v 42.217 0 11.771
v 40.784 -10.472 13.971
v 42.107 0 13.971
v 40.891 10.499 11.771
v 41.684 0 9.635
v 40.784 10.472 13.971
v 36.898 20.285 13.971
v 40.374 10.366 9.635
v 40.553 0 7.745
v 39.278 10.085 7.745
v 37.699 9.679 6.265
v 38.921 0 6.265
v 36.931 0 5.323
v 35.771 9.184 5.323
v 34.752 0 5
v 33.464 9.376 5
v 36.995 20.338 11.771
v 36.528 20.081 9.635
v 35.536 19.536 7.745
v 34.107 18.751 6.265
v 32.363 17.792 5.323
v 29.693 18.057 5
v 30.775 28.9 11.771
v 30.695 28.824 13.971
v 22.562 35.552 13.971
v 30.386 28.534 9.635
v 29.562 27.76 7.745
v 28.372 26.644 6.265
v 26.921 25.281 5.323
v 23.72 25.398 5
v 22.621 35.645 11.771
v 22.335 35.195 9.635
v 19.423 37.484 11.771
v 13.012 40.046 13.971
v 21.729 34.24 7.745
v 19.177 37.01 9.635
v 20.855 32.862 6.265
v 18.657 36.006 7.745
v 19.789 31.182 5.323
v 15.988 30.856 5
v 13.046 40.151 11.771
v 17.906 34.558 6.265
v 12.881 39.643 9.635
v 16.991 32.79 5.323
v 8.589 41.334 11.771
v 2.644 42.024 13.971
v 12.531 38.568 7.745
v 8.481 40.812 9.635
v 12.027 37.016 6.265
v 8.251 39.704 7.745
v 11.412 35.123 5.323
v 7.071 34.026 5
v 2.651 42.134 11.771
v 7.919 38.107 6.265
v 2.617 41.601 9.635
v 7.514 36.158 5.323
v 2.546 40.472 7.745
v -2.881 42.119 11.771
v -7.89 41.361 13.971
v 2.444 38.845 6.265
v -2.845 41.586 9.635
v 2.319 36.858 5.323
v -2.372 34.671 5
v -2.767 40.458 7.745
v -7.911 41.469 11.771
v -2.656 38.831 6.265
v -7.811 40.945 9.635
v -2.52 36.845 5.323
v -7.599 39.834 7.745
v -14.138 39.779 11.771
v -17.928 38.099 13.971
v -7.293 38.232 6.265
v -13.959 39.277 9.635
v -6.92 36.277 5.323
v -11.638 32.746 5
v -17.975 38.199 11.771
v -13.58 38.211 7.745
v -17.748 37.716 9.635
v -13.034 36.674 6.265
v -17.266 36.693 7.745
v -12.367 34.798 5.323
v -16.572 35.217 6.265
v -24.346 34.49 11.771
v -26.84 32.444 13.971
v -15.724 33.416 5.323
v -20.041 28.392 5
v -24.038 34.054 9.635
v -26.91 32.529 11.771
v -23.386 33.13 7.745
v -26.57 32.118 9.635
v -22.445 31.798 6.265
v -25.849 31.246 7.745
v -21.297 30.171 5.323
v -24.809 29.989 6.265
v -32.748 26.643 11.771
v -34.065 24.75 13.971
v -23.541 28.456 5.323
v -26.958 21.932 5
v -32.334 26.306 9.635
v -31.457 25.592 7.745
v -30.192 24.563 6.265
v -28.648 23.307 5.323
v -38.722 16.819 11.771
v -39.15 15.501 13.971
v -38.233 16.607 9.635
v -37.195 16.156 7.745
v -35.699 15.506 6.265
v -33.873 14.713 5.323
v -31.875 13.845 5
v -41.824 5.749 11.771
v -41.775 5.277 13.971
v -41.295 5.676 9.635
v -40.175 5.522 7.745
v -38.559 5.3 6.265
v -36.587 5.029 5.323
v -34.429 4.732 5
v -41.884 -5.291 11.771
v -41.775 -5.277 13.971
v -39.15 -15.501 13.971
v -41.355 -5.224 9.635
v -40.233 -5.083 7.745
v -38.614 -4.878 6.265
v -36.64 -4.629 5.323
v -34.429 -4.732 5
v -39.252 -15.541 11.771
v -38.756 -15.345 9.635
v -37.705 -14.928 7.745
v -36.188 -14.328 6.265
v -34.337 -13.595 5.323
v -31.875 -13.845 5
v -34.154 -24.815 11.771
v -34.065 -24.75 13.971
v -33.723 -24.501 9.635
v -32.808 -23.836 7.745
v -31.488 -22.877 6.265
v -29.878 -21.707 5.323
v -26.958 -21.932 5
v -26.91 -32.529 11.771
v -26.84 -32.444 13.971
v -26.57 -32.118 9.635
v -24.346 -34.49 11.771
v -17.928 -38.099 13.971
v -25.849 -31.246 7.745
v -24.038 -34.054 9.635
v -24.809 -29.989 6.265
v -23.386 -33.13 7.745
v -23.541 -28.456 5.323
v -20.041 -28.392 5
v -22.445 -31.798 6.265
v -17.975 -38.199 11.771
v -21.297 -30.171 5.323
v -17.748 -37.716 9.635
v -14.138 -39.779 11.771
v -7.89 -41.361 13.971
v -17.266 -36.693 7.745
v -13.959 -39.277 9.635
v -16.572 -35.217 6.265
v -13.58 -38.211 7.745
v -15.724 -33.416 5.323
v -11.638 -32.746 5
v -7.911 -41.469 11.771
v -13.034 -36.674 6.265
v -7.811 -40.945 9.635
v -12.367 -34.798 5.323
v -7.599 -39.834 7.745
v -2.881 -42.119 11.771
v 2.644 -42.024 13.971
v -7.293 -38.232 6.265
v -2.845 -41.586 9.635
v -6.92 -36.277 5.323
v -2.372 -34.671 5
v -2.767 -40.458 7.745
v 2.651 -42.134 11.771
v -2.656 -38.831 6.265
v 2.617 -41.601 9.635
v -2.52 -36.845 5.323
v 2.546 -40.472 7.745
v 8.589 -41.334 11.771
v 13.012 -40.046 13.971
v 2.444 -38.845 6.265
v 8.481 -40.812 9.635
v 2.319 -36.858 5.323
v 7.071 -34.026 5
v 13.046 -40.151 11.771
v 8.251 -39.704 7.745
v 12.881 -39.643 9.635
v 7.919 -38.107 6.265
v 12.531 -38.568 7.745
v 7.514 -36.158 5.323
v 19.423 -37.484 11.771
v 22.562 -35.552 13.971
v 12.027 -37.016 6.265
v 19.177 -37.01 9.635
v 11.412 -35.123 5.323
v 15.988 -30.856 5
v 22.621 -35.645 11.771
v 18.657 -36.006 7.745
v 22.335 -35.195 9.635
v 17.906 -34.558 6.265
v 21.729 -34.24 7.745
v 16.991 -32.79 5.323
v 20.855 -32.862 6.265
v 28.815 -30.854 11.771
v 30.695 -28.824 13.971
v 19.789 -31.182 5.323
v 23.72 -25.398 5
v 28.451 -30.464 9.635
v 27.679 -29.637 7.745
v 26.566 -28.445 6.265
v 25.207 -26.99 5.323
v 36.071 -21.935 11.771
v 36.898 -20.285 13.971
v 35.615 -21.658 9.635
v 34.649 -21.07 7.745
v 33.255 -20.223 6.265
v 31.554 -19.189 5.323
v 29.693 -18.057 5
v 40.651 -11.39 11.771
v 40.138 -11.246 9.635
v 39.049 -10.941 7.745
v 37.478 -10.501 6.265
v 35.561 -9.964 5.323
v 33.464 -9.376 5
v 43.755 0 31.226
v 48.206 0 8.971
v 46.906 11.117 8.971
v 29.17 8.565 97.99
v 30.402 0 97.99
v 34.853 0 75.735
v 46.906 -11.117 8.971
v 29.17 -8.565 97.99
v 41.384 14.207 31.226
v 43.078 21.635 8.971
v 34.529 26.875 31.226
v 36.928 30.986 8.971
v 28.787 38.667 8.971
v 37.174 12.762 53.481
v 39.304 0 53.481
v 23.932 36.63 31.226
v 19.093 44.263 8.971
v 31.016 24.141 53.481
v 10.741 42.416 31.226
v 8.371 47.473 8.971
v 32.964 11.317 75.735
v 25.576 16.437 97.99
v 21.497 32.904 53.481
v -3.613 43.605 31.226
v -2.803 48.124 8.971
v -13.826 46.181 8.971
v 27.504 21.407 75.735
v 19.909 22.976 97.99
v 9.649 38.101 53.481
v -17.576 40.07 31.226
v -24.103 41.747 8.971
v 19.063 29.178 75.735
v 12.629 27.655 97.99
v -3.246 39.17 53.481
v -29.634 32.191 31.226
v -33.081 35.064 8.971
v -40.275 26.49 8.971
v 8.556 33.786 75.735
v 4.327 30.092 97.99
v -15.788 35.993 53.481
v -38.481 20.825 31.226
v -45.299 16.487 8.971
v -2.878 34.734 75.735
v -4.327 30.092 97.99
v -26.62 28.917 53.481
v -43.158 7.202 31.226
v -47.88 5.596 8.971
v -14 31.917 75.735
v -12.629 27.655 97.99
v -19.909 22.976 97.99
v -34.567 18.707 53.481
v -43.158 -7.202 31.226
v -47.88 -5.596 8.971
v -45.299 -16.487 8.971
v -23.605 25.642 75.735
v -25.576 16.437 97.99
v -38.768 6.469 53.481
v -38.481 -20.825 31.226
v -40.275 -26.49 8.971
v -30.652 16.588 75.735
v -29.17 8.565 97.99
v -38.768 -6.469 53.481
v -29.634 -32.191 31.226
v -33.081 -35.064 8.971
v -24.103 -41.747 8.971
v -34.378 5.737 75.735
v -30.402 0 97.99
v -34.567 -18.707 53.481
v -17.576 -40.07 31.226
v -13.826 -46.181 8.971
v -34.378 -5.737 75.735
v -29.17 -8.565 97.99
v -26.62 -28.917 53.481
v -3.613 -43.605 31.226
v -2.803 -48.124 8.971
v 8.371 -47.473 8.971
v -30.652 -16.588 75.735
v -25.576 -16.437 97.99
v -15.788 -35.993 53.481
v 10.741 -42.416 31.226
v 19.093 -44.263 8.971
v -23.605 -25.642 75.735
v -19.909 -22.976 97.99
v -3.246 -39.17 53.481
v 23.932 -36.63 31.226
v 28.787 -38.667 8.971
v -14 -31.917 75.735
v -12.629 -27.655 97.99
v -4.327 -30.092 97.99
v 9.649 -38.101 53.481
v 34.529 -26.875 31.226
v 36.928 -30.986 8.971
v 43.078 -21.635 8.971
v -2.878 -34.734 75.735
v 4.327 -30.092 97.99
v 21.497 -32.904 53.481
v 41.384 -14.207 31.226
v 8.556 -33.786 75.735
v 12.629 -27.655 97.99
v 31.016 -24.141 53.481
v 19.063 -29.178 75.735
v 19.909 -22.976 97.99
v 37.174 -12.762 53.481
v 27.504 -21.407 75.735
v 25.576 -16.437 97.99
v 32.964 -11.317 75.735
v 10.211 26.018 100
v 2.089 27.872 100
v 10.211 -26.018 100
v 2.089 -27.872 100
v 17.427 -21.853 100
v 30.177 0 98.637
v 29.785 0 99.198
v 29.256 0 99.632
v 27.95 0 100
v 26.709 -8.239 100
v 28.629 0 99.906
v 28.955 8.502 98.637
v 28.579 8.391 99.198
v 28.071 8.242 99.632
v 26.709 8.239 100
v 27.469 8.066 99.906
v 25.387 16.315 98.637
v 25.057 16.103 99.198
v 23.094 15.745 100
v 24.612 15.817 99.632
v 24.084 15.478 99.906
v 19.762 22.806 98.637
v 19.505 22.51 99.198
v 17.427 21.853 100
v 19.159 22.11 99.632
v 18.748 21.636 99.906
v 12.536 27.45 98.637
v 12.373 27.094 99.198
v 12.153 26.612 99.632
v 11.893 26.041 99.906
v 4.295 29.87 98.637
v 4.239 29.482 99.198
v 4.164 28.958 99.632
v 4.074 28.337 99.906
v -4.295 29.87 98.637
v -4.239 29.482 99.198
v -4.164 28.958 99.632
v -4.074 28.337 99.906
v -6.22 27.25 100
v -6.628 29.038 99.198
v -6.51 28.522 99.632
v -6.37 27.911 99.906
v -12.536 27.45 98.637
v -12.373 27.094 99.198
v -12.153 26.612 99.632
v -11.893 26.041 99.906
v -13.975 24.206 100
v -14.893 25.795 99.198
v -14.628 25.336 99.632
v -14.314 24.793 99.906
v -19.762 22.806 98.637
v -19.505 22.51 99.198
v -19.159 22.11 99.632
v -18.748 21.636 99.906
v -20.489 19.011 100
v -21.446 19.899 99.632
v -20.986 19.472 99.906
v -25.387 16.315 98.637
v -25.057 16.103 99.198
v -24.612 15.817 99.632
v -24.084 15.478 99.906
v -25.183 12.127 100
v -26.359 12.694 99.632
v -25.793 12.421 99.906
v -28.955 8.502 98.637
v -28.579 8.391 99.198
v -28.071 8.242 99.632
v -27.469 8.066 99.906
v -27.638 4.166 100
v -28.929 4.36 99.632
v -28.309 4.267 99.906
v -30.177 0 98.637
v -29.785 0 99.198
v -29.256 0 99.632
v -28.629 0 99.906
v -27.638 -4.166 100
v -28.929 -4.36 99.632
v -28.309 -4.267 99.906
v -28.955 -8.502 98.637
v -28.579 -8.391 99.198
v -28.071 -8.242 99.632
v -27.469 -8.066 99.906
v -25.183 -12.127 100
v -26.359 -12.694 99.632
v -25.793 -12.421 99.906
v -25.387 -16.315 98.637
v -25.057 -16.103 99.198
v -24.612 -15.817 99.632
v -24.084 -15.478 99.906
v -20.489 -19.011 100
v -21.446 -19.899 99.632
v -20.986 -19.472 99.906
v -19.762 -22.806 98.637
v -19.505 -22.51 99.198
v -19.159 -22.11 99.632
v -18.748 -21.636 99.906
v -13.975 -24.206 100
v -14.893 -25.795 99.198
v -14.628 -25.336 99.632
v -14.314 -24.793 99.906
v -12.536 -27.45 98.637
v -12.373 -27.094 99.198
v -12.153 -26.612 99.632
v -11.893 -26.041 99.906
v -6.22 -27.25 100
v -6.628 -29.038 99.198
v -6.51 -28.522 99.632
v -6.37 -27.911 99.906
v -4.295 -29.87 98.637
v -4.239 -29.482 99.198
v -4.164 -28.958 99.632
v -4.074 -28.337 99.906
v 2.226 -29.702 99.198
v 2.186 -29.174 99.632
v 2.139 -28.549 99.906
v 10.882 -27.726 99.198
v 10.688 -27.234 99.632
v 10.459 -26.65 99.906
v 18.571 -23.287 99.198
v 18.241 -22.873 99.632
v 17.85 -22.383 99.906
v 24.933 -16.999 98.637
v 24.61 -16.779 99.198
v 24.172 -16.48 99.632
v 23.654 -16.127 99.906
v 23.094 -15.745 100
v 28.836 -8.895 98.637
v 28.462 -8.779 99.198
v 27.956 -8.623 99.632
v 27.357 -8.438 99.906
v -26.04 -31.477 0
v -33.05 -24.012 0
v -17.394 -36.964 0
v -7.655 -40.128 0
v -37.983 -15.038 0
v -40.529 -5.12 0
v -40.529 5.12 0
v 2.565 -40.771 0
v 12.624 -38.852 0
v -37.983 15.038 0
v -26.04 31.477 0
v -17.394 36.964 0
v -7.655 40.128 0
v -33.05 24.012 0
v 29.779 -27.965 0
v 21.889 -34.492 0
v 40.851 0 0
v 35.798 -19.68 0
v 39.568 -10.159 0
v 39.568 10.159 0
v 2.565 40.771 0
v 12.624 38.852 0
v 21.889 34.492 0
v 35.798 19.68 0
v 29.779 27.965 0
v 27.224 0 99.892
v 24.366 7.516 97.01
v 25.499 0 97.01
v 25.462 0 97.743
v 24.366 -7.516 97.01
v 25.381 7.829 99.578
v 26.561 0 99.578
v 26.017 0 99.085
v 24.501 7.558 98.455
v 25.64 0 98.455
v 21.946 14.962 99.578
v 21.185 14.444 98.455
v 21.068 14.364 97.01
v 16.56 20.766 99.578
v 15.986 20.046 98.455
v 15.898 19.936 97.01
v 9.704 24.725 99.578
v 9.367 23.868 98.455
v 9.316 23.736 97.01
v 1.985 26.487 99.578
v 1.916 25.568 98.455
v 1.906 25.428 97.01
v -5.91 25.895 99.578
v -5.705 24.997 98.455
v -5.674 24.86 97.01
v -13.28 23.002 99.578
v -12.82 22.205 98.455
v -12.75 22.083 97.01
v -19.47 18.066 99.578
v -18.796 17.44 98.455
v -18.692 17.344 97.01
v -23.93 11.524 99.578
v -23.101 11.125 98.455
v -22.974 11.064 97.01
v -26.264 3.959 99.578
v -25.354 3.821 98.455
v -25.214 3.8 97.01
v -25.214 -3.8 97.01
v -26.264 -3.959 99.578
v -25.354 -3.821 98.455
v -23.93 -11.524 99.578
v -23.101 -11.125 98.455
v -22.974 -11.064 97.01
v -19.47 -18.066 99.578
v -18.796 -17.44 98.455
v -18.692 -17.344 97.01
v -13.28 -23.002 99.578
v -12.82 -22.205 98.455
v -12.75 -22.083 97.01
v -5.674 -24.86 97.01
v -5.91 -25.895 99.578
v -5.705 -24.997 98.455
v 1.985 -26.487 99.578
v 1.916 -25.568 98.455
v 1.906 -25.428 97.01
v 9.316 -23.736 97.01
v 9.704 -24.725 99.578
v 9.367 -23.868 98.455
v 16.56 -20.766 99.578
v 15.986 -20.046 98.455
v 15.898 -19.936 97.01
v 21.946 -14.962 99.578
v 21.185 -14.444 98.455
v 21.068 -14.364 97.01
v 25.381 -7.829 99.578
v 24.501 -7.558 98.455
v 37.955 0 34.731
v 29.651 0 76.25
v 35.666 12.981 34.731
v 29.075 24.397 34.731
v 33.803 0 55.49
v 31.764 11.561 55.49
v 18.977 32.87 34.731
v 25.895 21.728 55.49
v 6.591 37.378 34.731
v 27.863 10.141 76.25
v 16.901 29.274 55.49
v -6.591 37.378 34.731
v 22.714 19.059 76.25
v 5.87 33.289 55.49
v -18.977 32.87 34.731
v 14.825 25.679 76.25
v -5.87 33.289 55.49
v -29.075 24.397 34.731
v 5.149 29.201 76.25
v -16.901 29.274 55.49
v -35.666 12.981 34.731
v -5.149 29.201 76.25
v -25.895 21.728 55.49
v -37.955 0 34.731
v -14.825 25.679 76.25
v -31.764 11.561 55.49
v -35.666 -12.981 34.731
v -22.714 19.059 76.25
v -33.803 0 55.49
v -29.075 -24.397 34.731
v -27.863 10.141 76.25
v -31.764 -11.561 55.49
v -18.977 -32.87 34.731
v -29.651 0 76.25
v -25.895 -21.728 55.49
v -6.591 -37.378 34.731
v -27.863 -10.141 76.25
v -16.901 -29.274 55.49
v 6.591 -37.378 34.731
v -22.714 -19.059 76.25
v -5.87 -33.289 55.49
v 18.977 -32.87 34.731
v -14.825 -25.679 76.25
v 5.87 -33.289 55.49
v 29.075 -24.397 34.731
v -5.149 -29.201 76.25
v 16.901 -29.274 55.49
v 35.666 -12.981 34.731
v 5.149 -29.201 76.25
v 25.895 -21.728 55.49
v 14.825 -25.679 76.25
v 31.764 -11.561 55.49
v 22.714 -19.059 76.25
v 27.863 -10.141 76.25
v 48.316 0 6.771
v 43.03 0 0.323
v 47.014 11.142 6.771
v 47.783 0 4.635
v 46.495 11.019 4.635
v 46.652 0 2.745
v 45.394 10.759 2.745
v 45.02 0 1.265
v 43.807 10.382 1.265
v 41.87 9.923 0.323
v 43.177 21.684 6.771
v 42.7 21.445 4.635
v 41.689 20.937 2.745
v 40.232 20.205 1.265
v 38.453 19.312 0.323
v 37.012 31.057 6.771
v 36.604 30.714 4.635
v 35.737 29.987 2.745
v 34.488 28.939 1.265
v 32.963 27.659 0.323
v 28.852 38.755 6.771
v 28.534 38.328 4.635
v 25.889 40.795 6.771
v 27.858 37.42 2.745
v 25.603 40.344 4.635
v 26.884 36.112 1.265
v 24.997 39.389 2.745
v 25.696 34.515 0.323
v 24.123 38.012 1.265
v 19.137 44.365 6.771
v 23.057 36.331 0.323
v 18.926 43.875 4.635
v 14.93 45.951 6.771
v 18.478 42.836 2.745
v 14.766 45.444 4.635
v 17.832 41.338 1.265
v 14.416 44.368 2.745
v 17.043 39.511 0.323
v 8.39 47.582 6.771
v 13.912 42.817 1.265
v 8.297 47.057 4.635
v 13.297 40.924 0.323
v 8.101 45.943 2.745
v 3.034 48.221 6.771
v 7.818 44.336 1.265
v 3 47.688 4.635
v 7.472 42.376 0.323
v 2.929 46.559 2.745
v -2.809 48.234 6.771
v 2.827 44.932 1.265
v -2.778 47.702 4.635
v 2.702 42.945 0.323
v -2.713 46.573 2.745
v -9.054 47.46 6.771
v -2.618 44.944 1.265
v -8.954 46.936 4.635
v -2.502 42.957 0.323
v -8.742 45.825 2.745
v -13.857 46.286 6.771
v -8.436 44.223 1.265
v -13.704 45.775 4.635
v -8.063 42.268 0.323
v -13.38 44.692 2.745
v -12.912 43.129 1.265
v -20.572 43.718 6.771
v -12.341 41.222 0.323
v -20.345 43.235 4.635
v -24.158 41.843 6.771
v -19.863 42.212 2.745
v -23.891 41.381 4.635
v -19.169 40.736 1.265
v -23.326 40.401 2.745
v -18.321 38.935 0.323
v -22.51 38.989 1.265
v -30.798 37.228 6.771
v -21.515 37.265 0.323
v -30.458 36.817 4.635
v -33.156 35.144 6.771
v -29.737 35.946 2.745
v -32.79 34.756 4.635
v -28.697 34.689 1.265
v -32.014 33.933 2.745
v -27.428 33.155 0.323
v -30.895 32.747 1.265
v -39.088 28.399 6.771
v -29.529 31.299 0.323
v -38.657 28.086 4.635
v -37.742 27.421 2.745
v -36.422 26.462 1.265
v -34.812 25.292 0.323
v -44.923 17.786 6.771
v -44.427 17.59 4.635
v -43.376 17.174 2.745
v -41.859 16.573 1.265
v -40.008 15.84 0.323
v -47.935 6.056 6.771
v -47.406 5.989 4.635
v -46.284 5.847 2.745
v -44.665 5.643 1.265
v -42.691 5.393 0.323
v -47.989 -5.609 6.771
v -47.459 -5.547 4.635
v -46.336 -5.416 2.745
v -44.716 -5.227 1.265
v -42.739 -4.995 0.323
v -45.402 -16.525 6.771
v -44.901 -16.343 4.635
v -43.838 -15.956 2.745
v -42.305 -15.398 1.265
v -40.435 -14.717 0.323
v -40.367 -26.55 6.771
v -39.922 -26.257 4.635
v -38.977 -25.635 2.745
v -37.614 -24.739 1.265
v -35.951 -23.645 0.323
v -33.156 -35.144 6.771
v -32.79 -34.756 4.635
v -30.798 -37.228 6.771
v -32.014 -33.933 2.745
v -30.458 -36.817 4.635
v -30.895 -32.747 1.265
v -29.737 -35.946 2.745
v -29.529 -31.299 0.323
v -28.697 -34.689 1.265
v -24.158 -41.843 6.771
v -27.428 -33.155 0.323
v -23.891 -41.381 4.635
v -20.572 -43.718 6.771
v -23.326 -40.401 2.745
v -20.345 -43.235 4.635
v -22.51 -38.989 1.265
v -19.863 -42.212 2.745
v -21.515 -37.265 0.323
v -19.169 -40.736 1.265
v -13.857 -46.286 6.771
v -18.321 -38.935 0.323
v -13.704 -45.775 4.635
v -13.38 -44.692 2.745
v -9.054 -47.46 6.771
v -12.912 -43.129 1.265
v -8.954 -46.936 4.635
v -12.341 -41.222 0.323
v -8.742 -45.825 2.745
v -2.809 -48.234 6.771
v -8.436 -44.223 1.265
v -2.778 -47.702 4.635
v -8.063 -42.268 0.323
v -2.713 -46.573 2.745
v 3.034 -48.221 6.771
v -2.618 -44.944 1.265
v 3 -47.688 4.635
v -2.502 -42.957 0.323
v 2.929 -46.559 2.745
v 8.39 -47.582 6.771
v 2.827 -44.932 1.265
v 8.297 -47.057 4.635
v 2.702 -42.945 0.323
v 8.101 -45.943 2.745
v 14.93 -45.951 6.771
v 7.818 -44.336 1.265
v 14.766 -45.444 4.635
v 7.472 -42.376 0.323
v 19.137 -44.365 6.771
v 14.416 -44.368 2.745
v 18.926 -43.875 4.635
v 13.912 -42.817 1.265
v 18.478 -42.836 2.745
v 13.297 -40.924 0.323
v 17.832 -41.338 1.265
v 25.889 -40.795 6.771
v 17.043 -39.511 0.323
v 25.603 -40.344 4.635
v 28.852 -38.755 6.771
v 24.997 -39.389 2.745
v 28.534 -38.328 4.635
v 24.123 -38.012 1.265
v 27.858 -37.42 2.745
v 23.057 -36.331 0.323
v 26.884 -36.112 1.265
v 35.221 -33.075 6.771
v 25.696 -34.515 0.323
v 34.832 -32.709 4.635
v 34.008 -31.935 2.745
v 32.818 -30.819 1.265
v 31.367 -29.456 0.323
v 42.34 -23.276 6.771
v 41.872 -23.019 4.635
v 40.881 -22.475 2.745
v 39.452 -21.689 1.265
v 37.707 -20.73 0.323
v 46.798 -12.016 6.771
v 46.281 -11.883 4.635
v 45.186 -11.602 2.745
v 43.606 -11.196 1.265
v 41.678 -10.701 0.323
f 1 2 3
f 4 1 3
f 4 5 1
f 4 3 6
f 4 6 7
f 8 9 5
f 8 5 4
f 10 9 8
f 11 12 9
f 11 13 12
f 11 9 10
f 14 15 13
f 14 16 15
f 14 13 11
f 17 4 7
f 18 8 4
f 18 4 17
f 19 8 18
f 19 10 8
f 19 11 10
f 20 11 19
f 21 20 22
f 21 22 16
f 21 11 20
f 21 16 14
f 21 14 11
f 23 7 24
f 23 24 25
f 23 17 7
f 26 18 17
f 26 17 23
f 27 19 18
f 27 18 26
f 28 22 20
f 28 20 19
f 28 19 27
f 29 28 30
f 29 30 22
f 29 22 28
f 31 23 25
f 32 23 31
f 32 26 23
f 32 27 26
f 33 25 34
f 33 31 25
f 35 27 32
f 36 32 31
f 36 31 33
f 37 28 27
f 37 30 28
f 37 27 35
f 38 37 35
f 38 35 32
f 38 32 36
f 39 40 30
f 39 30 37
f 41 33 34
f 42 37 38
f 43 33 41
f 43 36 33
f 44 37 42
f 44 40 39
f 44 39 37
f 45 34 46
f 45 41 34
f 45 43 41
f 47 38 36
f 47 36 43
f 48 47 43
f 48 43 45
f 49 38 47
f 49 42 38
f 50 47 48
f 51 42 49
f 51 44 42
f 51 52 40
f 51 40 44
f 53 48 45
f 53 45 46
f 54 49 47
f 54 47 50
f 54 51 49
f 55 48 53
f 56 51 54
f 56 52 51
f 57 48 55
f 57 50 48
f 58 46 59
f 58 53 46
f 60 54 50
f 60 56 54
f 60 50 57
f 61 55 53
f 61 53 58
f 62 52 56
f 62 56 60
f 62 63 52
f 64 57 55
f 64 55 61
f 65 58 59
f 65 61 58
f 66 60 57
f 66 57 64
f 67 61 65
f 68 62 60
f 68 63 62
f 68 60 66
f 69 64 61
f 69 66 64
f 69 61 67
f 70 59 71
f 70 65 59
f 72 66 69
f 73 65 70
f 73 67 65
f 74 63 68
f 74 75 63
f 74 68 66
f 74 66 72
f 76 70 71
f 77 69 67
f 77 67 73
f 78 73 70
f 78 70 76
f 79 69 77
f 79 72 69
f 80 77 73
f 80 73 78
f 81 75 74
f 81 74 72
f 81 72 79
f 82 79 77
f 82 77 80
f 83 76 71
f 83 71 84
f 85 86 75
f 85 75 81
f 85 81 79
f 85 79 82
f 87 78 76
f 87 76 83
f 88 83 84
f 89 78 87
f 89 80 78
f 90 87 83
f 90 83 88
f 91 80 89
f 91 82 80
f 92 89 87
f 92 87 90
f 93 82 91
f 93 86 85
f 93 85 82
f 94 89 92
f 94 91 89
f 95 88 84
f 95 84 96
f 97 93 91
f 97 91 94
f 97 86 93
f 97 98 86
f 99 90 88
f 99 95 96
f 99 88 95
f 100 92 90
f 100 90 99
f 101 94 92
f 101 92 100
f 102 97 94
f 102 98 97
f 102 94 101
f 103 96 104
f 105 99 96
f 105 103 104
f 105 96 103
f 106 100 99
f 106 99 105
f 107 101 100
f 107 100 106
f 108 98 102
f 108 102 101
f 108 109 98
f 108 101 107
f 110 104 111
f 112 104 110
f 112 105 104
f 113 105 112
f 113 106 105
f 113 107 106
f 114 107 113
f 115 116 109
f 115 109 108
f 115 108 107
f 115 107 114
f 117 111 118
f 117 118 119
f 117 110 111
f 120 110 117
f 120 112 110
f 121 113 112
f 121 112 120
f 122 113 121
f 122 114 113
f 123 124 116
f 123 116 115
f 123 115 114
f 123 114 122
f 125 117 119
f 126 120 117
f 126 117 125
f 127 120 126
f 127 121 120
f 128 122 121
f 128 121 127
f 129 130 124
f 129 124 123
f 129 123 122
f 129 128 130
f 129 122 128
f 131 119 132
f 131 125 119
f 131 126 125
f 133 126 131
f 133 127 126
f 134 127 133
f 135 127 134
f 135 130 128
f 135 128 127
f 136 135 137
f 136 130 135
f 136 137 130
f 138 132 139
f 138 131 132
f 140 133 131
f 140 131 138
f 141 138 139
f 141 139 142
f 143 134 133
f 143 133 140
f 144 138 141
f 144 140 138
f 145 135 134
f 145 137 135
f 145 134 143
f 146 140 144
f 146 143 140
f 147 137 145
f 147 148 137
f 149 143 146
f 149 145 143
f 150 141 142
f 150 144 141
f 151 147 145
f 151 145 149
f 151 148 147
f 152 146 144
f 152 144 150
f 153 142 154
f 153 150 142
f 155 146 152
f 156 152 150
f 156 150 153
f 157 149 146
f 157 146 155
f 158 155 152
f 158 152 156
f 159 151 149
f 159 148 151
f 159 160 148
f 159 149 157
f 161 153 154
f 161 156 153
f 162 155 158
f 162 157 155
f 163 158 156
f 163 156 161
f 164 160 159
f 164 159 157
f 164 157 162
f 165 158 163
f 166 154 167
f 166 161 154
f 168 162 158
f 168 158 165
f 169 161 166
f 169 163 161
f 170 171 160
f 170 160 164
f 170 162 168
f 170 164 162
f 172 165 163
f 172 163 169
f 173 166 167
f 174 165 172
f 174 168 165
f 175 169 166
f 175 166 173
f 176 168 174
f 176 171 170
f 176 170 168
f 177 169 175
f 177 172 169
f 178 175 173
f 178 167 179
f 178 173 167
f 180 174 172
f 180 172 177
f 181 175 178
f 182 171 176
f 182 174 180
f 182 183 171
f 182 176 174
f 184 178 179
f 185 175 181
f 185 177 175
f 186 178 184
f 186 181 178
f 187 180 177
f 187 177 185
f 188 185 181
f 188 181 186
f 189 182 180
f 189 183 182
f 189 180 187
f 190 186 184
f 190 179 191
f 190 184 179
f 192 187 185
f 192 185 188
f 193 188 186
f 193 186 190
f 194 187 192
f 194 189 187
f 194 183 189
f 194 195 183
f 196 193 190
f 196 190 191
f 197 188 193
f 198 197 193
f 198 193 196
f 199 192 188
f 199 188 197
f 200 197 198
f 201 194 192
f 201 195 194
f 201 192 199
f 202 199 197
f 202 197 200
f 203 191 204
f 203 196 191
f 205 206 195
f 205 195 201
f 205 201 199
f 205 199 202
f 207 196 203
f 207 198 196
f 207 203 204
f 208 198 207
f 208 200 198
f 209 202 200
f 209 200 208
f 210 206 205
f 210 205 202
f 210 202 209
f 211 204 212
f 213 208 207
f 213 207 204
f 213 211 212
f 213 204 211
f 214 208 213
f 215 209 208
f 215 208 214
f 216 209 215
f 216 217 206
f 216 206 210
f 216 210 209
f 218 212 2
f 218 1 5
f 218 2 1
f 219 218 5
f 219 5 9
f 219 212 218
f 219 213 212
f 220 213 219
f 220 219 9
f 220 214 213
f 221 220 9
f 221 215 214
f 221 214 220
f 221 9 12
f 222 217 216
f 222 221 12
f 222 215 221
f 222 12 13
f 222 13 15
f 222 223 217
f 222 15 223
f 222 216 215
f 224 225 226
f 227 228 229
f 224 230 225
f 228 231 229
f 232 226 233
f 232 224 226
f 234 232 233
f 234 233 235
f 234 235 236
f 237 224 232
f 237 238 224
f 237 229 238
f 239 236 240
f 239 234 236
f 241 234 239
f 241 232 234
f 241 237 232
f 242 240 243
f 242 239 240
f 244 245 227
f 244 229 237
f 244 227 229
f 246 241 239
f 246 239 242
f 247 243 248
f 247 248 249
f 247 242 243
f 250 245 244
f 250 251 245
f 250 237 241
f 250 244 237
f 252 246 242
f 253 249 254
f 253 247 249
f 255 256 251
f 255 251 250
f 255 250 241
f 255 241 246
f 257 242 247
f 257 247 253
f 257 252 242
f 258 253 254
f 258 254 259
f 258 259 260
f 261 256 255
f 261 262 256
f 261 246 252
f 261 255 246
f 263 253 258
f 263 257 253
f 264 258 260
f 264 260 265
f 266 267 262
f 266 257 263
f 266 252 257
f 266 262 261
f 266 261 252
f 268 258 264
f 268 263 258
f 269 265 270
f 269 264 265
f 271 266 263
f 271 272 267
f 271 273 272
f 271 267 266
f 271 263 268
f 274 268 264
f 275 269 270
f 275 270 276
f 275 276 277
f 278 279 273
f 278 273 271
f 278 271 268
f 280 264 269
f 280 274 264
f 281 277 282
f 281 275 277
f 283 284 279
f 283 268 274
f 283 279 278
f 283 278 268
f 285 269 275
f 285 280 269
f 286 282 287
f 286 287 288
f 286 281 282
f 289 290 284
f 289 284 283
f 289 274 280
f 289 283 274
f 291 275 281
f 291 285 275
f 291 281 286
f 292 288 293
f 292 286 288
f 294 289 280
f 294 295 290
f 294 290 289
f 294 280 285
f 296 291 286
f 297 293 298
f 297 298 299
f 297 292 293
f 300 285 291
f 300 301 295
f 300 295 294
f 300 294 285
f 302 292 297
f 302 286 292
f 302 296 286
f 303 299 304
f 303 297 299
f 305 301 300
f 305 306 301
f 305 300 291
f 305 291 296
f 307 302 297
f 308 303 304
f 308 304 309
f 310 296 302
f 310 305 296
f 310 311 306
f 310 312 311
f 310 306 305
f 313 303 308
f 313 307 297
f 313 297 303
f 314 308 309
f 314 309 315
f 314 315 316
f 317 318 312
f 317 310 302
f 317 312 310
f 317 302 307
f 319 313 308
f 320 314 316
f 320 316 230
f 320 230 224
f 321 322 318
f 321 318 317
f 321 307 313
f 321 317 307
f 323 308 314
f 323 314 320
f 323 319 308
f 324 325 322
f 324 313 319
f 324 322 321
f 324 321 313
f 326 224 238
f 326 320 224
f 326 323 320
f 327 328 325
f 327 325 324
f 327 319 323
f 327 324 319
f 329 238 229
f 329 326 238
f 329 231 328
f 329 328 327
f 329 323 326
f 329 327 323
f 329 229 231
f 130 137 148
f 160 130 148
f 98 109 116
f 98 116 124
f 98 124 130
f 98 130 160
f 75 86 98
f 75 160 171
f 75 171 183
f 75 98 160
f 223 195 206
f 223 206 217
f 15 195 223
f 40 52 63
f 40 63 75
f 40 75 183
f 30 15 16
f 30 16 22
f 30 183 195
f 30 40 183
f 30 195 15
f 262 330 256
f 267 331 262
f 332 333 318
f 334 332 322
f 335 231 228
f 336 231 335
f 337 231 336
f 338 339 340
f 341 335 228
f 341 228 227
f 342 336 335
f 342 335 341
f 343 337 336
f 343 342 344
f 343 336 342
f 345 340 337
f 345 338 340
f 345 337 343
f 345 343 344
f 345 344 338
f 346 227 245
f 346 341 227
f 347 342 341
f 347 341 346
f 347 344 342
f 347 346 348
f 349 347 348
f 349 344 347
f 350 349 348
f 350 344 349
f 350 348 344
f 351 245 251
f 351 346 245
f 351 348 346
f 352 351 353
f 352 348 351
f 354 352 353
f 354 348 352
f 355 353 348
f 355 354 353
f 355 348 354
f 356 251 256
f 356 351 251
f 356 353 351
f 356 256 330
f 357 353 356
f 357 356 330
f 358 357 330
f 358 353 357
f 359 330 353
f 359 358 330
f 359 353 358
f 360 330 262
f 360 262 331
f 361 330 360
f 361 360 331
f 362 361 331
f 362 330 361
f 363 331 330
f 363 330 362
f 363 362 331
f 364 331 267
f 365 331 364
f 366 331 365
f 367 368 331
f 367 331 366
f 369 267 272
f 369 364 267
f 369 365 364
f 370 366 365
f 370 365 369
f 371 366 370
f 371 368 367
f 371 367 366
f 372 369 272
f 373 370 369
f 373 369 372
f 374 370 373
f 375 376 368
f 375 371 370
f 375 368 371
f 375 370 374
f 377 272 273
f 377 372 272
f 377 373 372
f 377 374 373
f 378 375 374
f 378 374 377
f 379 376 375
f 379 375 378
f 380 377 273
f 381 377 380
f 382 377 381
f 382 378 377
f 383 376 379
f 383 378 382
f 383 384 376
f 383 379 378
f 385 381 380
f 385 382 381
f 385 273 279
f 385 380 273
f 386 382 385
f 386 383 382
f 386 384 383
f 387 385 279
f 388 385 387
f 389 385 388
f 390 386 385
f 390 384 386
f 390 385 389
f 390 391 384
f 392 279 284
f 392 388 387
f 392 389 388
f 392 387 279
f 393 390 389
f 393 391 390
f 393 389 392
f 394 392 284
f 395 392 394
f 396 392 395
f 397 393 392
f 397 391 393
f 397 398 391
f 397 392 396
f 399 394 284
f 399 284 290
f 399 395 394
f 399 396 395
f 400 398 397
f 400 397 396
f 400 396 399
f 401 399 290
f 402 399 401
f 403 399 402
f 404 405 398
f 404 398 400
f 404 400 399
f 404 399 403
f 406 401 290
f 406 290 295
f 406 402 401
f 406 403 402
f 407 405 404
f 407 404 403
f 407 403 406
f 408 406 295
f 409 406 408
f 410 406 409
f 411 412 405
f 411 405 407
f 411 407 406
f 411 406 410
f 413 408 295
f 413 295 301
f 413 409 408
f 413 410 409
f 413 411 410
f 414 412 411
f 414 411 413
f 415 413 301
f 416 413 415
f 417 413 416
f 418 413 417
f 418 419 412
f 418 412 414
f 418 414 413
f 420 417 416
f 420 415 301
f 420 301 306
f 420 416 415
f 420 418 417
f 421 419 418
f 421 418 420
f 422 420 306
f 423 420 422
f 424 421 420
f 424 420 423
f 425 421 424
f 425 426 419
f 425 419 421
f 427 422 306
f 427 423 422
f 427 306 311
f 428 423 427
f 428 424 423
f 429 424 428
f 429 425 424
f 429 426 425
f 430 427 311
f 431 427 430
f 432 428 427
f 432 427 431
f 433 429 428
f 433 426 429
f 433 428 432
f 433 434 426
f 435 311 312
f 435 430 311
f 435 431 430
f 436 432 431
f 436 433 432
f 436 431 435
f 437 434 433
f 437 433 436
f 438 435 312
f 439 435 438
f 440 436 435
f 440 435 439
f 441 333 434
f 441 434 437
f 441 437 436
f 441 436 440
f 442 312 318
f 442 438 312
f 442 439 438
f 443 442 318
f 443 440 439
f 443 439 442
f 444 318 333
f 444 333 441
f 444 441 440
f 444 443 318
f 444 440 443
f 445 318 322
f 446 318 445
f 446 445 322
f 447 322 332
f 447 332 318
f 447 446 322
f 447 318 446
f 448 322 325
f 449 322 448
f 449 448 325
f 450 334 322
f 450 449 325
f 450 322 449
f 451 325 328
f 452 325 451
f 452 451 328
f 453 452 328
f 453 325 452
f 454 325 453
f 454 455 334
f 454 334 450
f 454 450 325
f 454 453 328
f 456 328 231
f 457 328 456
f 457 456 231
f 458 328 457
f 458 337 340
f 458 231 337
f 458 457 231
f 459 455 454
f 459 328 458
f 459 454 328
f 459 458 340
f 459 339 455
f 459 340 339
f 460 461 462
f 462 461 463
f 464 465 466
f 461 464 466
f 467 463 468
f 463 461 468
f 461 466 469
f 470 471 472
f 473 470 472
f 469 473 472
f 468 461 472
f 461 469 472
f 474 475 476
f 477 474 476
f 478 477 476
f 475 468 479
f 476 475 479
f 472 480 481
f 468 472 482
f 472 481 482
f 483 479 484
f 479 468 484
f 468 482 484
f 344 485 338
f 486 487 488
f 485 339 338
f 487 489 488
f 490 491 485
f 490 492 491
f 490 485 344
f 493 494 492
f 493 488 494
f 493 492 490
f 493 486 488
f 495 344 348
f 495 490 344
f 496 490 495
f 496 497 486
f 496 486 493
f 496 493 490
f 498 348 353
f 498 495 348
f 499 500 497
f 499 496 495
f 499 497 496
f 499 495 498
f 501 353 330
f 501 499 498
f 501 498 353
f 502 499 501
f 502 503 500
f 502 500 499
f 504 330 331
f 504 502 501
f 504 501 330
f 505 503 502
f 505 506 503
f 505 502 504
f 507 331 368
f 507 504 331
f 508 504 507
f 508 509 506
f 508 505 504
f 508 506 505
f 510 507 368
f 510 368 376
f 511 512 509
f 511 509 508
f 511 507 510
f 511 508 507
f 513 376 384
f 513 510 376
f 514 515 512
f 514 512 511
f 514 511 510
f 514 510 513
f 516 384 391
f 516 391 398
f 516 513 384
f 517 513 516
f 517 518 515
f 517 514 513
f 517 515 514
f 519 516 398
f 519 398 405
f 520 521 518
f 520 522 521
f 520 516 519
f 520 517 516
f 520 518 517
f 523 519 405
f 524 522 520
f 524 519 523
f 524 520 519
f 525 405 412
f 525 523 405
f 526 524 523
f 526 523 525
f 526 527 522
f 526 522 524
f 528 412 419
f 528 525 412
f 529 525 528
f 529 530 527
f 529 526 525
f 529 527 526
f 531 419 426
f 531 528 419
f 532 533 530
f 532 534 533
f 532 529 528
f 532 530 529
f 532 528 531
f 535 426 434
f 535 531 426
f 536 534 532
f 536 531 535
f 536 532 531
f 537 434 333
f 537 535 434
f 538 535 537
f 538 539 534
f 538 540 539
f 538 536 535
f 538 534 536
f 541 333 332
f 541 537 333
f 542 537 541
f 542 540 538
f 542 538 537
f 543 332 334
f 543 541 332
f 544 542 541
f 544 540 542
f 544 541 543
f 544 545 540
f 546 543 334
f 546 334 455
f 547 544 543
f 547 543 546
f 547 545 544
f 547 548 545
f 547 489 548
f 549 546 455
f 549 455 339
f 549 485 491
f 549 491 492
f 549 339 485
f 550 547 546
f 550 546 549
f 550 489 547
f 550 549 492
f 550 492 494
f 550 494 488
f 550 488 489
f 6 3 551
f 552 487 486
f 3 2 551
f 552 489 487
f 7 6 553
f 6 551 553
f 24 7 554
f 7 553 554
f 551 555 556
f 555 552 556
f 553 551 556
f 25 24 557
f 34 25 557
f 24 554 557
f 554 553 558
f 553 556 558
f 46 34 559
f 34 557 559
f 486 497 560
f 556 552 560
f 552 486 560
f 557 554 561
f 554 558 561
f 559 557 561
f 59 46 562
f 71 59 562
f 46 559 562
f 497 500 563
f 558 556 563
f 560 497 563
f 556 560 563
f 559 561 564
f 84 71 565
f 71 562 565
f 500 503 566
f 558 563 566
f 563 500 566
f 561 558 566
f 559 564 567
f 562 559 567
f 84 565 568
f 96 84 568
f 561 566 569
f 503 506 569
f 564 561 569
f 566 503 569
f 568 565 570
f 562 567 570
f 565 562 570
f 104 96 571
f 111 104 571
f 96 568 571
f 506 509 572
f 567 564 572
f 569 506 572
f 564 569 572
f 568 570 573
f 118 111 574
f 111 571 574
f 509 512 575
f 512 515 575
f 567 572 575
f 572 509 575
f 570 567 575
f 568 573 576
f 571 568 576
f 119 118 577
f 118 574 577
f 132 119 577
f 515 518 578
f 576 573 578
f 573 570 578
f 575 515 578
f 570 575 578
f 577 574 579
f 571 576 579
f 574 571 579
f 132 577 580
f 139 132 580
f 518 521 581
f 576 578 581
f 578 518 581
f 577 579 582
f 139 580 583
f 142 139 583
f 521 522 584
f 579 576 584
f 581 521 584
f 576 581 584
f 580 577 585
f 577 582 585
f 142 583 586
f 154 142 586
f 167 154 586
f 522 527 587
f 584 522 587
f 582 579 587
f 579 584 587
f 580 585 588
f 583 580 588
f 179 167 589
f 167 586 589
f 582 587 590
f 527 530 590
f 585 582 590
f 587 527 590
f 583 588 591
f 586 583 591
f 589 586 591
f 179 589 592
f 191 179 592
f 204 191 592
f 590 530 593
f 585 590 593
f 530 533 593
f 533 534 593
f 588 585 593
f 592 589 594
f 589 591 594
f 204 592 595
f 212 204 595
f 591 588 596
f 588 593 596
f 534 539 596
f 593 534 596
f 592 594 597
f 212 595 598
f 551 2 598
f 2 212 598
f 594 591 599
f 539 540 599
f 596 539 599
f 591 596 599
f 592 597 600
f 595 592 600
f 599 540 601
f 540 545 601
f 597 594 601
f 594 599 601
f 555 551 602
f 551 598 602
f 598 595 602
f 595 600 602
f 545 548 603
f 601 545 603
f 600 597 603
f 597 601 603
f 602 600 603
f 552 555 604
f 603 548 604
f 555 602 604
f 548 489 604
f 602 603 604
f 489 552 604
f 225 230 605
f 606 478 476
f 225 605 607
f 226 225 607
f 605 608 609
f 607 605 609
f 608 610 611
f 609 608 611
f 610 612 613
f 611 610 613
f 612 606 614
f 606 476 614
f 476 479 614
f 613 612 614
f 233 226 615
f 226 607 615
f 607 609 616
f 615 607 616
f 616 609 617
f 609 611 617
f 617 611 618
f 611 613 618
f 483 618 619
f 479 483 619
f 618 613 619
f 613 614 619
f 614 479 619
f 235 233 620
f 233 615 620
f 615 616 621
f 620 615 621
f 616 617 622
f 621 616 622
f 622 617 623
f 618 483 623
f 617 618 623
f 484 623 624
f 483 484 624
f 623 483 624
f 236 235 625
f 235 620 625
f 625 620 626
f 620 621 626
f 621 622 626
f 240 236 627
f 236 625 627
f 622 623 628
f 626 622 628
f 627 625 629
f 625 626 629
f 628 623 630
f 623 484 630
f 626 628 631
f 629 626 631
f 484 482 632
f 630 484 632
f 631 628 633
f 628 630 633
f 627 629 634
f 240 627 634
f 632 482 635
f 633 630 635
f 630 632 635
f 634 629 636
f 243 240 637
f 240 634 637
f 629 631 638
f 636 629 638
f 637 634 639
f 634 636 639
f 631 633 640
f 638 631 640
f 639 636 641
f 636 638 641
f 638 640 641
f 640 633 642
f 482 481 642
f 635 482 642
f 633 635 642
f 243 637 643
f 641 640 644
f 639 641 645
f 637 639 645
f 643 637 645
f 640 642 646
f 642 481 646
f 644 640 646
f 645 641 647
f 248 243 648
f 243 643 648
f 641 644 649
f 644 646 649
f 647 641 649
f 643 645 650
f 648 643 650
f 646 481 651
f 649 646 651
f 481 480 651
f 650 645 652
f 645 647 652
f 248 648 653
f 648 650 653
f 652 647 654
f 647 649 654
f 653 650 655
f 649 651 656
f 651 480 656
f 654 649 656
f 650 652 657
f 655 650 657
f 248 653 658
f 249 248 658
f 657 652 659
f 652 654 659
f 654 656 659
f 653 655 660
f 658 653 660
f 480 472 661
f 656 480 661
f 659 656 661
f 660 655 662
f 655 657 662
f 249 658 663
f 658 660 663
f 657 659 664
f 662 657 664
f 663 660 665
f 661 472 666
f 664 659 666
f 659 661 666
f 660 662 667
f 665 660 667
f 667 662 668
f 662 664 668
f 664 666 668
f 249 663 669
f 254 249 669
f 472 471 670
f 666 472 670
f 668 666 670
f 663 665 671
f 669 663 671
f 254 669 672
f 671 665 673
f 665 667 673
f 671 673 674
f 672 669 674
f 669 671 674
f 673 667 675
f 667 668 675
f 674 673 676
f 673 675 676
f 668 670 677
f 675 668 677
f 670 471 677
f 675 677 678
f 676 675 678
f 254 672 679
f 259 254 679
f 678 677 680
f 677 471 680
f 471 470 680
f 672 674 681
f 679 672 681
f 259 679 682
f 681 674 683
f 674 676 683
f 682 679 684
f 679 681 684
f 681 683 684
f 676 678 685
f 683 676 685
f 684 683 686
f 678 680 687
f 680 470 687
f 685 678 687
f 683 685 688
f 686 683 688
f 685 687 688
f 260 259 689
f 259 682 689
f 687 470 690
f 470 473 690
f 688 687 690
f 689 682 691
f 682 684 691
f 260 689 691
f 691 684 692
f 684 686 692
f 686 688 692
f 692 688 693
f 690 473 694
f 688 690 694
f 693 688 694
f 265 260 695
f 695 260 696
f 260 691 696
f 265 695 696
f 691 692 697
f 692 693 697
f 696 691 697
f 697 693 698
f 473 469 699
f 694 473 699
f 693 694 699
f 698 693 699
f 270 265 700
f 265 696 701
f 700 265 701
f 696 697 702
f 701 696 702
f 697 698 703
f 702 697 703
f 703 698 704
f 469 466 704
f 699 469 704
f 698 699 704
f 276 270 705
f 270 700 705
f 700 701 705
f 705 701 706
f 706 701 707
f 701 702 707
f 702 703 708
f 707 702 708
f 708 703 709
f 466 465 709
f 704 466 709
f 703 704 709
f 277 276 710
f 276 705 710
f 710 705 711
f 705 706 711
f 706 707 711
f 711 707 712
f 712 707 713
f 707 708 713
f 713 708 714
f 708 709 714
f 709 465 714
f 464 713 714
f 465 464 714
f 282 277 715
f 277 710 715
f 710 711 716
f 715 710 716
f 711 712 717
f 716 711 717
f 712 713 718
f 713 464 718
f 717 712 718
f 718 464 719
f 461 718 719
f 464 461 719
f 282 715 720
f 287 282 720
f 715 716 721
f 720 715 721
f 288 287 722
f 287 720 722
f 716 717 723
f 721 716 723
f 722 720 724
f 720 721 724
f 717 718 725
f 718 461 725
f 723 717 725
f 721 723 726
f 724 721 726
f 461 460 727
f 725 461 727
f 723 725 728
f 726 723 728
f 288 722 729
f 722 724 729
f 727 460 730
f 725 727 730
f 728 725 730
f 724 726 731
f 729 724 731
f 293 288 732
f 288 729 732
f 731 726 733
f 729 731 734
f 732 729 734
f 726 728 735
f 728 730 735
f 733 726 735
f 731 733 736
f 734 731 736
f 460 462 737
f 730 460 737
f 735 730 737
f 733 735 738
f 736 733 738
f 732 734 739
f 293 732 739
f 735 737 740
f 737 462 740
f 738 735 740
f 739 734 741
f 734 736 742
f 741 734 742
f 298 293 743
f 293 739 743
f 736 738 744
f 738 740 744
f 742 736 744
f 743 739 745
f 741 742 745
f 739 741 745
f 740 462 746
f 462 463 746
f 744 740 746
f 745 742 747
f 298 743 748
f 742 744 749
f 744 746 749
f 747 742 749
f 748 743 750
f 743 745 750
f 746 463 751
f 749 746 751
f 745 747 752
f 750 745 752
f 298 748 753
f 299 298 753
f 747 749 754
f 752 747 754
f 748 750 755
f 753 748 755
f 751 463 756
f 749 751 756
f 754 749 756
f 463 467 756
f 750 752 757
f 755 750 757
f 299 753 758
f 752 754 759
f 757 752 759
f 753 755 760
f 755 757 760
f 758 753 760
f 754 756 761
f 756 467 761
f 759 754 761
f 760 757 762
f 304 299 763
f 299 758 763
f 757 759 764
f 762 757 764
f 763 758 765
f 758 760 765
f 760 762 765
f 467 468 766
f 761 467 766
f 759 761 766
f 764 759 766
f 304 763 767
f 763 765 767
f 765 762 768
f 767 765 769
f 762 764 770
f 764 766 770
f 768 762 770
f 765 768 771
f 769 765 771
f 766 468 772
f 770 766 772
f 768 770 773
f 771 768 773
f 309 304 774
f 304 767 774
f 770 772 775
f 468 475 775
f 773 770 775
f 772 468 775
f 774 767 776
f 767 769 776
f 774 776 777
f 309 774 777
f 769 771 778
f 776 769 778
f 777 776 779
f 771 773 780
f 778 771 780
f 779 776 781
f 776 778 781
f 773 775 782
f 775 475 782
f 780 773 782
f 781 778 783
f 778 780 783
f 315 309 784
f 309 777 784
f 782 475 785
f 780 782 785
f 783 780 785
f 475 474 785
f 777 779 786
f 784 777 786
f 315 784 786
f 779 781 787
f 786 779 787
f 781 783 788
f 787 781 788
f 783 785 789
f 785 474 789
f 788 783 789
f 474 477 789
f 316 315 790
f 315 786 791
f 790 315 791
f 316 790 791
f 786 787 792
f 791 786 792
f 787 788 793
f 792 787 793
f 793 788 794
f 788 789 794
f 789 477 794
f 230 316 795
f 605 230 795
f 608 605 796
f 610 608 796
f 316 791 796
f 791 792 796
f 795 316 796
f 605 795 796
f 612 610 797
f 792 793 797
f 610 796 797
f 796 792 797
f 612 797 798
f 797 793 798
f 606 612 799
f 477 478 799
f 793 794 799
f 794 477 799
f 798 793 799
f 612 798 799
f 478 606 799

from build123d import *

# Parameters (mm, degrees)
F0_R = 50
F2_R = 30
F4_T = -5
F5_R = 2.49999
F6_R = 7.5


# Not quite as in the source:
# - a fillet or chamfer is up to 0.001 mm smaller than in the source, because OpenCascade refuses the exact size


with BuildPart() as f3:
    # F0 (on Top) → F3 section 0
    with BuildSketch(Plane.XY):
        Circle(F0_R)
    # F2 (on offset) → F3 section 1
    with BuildSketch(Plane.XY.offset(100)):
        Circle(F2_R)
    loft()

    # F4
    f4_openings = [f3.faces().sort_by_distance(p)[0] for p in [
        (0, 0, 100),
    ]]
    offset(amount=F4_T, openings=f4_openings, kind=Kind.INTERSECTION)

    # F5 (radius 2.5 in the source; OpenCascade refuses exactly that, so slightly less here)
    f5_edges = [f3.edges().sort_by_distance(p)[0] for p in [
        (-30, 0, 100),
        (-24.90098, 0, 100),
    ]]
    fillet(f5_edges, radius=F5_R)

    # F6
    f6_edges = [f3.edges().sort_by_distance(p)[0] for p in [
        (-50, 0, 0),
        (-43.90098, 0, 5),
    ]]
    fillet(f6_edges, radius=F6_R)


solid = f3.part
